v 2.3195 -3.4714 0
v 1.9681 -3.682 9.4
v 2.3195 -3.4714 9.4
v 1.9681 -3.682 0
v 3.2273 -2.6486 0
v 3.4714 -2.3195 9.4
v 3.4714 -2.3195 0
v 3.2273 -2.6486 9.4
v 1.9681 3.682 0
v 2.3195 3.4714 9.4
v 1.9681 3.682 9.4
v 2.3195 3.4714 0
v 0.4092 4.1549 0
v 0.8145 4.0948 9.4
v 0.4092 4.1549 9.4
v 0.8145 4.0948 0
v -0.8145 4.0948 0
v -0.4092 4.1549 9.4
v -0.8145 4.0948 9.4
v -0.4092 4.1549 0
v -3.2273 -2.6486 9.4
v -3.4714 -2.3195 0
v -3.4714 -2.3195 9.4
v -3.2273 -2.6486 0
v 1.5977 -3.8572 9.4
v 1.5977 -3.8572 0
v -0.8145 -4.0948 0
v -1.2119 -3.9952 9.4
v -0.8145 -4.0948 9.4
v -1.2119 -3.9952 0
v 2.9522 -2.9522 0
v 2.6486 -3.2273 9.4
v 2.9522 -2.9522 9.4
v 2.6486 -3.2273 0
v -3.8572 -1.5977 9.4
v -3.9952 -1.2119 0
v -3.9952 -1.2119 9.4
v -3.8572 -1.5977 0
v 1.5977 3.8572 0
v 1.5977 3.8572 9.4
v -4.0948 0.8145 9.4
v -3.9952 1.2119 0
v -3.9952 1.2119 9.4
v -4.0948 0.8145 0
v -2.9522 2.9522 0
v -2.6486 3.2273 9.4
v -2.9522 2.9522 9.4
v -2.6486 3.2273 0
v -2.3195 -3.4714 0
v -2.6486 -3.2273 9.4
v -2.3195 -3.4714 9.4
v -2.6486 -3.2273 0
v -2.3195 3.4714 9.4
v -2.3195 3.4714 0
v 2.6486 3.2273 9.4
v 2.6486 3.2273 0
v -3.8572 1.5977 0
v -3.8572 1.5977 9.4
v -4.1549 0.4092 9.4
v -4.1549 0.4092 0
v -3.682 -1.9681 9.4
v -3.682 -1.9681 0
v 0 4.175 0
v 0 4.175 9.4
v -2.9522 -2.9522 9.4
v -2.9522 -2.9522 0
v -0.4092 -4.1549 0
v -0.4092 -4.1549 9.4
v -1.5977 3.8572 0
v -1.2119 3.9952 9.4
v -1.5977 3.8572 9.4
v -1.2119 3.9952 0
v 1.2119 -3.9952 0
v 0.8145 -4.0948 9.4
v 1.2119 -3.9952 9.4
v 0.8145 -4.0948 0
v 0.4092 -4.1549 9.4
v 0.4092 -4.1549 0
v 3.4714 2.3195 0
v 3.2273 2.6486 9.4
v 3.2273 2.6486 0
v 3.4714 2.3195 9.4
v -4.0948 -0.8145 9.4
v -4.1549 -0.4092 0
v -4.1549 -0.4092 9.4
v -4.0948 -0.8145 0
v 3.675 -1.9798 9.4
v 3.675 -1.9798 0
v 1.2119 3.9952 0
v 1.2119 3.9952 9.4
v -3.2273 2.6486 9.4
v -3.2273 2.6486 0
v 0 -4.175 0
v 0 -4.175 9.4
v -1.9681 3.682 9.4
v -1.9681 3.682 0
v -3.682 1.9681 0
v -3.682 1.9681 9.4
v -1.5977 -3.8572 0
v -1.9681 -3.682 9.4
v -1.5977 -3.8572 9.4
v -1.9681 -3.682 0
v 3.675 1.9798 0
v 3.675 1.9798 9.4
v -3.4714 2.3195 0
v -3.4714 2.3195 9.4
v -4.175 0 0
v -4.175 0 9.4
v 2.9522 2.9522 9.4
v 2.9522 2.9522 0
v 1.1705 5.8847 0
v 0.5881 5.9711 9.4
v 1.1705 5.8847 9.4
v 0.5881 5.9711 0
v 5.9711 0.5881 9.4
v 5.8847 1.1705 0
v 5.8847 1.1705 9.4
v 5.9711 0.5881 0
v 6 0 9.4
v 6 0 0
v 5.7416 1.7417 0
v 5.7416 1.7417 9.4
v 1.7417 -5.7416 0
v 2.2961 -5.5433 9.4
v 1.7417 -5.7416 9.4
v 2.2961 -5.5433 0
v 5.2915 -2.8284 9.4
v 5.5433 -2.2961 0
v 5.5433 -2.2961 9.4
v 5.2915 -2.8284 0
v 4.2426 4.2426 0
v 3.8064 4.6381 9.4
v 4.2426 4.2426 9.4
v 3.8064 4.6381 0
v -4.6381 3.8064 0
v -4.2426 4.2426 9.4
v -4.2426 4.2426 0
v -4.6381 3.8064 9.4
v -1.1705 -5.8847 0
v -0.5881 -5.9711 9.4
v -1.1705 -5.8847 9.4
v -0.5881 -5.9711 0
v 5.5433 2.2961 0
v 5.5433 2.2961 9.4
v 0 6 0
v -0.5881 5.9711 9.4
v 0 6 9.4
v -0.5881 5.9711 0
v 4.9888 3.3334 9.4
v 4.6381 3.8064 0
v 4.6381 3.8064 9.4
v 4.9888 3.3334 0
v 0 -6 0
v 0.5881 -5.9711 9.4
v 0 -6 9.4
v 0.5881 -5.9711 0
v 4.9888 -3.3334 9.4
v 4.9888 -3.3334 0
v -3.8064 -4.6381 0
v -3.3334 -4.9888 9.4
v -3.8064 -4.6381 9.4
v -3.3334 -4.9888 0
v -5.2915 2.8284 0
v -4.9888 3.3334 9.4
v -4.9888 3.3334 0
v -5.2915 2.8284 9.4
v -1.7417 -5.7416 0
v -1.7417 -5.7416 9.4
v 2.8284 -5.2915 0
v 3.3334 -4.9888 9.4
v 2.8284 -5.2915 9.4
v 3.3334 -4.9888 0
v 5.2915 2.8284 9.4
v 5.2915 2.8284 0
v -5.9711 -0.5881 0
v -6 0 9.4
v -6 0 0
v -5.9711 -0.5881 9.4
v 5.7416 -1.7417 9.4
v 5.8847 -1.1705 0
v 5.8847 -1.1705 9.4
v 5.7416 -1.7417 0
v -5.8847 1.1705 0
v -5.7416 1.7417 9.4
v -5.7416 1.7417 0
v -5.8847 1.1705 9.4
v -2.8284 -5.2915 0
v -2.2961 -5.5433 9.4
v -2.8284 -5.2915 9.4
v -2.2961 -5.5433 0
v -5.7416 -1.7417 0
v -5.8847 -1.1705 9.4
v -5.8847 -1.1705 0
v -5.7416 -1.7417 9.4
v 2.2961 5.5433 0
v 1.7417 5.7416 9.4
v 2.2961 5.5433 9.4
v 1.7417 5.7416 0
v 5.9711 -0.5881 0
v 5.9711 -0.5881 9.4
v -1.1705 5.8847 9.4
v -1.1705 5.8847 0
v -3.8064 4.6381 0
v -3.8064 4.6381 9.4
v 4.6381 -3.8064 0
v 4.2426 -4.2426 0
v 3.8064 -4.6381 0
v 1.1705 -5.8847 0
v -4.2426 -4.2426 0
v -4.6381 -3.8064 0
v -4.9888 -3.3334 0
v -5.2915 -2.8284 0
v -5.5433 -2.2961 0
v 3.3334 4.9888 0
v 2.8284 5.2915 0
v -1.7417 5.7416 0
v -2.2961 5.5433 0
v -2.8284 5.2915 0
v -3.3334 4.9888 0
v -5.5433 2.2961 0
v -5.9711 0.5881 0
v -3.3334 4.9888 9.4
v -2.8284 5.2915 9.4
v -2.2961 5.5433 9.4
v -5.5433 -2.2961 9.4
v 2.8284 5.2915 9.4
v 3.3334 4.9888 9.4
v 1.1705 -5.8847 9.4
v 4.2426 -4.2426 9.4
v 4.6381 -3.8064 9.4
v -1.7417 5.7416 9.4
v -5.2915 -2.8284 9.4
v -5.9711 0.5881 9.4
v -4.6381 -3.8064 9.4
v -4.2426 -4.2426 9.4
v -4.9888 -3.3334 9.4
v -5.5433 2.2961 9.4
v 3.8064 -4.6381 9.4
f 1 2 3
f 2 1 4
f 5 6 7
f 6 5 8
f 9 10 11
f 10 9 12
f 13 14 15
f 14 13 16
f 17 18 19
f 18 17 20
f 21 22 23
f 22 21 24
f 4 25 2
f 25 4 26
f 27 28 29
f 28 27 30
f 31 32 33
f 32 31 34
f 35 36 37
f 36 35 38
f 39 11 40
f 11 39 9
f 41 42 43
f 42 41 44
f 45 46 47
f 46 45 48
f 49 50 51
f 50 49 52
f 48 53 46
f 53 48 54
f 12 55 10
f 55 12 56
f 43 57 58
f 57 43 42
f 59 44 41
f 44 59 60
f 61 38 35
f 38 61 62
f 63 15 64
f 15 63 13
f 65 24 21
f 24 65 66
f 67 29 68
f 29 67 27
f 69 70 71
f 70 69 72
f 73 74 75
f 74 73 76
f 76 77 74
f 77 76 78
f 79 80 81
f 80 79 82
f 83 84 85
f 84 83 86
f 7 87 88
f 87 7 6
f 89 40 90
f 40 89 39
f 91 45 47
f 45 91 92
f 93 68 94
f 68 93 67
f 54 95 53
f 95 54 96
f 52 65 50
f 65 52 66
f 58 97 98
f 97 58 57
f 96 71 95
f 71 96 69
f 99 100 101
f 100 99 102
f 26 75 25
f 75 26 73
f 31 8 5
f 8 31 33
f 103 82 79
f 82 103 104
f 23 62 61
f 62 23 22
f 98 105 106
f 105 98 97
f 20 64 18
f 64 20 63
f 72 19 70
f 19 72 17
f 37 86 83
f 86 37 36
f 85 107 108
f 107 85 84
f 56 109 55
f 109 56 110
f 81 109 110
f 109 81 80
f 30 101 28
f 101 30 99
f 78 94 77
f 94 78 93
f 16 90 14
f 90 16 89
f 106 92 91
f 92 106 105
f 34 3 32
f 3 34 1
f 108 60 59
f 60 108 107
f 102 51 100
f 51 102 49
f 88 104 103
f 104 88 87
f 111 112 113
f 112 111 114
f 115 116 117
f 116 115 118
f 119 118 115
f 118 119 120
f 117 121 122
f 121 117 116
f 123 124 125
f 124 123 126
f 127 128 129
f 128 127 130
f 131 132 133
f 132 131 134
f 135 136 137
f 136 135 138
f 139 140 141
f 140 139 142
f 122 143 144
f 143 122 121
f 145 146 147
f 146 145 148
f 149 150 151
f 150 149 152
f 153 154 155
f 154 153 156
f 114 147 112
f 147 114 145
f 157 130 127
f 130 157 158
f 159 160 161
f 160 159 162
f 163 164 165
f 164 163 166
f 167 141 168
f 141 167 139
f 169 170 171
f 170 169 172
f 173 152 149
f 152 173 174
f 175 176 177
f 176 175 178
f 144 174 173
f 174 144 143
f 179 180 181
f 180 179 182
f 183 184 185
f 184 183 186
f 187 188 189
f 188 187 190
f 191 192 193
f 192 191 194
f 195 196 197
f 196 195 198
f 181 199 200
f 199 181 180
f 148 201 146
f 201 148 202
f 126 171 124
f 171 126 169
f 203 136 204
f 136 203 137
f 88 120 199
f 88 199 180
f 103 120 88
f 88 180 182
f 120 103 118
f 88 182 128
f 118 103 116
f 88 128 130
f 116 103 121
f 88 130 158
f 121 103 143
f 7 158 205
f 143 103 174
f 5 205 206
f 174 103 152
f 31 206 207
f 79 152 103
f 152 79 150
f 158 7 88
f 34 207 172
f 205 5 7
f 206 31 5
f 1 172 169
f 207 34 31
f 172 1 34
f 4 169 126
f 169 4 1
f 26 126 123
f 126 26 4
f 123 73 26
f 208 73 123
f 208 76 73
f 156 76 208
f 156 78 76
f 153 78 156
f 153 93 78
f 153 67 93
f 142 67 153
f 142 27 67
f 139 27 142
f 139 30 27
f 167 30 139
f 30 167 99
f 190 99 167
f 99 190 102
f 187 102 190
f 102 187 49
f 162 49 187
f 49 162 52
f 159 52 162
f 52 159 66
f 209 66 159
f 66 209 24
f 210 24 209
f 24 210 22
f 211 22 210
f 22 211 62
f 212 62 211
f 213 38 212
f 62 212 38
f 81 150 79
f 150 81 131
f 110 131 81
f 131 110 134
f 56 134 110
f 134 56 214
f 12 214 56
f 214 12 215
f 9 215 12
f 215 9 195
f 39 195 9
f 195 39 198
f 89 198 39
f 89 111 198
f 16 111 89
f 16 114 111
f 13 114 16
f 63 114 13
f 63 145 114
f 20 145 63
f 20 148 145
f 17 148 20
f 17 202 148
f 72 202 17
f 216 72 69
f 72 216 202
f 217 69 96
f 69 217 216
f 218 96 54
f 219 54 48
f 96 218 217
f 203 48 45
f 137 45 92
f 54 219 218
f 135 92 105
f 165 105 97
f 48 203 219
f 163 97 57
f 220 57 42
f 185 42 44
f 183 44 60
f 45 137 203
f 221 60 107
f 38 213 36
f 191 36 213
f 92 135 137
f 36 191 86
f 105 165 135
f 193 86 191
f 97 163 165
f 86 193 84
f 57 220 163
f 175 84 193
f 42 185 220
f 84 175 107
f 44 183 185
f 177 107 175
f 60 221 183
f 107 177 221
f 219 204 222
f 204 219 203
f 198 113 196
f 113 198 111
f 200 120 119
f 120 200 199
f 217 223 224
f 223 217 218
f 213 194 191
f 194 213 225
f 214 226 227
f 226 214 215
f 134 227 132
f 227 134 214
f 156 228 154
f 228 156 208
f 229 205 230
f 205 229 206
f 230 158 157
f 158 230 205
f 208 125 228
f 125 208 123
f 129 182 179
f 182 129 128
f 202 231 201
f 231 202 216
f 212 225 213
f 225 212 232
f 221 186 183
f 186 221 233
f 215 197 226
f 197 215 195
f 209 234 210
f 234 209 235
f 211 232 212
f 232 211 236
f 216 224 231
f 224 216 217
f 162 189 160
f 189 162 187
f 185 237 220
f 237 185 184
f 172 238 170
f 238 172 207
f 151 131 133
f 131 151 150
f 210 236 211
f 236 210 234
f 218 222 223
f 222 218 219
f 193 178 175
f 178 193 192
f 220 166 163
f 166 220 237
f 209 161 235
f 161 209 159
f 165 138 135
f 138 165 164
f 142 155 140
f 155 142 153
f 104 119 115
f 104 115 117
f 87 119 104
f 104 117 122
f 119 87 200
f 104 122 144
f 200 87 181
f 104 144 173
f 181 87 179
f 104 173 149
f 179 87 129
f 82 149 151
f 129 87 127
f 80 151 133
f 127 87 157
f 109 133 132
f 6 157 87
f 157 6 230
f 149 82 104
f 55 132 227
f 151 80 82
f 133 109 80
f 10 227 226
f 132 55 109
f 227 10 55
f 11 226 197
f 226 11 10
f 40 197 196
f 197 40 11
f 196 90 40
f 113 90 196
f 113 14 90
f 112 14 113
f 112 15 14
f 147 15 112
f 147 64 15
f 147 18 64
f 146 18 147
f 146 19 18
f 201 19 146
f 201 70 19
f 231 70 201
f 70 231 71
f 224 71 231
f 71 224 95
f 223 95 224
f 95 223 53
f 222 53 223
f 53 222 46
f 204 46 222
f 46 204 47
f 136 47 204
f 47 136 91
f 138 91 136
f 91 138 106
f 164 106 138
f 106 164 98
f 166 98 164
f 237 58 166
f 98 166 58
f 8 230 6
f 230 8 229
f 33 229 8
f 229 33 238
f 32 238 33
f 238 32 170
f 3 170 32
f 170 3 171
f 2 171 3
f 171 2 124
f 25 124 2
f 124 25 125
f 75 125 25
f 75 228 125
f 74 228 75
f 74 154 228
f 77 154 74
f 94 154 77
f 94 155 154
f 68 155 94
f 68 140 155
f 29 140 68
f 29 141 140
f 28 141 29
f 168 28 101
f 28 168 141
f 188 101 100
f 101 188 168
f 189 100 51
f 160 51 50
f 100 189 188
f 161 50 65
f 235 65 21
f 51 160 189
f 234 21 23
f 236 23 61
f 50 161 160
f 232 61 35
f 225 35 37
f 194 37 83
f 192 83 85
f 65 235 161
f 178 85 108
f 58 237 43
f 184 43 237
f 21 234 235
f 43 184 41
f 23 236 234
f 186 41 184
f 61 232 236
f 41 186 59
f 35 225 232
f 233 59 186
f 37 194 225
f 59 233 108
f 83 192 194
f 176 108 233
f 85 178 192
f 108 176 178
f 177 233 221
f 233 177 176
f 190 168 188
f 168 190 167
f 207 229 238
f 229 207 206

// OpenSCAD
// Gen-CY — gap sleeve: rigid spacer on the shaft BETWEEN the two rotor carriers (passes through the stator
// hole). Length = m2m, so it sets the magnet gap and carries the full magnet pull. Print x1, upright.
include <parameters.scad>;
$fn = 64;
// D-flat keyed bore: flat faces +X (angle 0 = magnet pocket 0 = index notch)
module dflat_bore(h) {
    intersection() {
        cylinder(d=shaft_bore, h=h);
        translate([-shaft_bore, -shaft_bore, 0]) cube([shaft_bore + dflat_x, 2*shaft_bore, h]);
    }
}

difference() {
    cylinder(d=sleeve_od, h=m2m);
    translate([0, 0, -0.1]) dflat_bore(m2m + 0.2);
}
